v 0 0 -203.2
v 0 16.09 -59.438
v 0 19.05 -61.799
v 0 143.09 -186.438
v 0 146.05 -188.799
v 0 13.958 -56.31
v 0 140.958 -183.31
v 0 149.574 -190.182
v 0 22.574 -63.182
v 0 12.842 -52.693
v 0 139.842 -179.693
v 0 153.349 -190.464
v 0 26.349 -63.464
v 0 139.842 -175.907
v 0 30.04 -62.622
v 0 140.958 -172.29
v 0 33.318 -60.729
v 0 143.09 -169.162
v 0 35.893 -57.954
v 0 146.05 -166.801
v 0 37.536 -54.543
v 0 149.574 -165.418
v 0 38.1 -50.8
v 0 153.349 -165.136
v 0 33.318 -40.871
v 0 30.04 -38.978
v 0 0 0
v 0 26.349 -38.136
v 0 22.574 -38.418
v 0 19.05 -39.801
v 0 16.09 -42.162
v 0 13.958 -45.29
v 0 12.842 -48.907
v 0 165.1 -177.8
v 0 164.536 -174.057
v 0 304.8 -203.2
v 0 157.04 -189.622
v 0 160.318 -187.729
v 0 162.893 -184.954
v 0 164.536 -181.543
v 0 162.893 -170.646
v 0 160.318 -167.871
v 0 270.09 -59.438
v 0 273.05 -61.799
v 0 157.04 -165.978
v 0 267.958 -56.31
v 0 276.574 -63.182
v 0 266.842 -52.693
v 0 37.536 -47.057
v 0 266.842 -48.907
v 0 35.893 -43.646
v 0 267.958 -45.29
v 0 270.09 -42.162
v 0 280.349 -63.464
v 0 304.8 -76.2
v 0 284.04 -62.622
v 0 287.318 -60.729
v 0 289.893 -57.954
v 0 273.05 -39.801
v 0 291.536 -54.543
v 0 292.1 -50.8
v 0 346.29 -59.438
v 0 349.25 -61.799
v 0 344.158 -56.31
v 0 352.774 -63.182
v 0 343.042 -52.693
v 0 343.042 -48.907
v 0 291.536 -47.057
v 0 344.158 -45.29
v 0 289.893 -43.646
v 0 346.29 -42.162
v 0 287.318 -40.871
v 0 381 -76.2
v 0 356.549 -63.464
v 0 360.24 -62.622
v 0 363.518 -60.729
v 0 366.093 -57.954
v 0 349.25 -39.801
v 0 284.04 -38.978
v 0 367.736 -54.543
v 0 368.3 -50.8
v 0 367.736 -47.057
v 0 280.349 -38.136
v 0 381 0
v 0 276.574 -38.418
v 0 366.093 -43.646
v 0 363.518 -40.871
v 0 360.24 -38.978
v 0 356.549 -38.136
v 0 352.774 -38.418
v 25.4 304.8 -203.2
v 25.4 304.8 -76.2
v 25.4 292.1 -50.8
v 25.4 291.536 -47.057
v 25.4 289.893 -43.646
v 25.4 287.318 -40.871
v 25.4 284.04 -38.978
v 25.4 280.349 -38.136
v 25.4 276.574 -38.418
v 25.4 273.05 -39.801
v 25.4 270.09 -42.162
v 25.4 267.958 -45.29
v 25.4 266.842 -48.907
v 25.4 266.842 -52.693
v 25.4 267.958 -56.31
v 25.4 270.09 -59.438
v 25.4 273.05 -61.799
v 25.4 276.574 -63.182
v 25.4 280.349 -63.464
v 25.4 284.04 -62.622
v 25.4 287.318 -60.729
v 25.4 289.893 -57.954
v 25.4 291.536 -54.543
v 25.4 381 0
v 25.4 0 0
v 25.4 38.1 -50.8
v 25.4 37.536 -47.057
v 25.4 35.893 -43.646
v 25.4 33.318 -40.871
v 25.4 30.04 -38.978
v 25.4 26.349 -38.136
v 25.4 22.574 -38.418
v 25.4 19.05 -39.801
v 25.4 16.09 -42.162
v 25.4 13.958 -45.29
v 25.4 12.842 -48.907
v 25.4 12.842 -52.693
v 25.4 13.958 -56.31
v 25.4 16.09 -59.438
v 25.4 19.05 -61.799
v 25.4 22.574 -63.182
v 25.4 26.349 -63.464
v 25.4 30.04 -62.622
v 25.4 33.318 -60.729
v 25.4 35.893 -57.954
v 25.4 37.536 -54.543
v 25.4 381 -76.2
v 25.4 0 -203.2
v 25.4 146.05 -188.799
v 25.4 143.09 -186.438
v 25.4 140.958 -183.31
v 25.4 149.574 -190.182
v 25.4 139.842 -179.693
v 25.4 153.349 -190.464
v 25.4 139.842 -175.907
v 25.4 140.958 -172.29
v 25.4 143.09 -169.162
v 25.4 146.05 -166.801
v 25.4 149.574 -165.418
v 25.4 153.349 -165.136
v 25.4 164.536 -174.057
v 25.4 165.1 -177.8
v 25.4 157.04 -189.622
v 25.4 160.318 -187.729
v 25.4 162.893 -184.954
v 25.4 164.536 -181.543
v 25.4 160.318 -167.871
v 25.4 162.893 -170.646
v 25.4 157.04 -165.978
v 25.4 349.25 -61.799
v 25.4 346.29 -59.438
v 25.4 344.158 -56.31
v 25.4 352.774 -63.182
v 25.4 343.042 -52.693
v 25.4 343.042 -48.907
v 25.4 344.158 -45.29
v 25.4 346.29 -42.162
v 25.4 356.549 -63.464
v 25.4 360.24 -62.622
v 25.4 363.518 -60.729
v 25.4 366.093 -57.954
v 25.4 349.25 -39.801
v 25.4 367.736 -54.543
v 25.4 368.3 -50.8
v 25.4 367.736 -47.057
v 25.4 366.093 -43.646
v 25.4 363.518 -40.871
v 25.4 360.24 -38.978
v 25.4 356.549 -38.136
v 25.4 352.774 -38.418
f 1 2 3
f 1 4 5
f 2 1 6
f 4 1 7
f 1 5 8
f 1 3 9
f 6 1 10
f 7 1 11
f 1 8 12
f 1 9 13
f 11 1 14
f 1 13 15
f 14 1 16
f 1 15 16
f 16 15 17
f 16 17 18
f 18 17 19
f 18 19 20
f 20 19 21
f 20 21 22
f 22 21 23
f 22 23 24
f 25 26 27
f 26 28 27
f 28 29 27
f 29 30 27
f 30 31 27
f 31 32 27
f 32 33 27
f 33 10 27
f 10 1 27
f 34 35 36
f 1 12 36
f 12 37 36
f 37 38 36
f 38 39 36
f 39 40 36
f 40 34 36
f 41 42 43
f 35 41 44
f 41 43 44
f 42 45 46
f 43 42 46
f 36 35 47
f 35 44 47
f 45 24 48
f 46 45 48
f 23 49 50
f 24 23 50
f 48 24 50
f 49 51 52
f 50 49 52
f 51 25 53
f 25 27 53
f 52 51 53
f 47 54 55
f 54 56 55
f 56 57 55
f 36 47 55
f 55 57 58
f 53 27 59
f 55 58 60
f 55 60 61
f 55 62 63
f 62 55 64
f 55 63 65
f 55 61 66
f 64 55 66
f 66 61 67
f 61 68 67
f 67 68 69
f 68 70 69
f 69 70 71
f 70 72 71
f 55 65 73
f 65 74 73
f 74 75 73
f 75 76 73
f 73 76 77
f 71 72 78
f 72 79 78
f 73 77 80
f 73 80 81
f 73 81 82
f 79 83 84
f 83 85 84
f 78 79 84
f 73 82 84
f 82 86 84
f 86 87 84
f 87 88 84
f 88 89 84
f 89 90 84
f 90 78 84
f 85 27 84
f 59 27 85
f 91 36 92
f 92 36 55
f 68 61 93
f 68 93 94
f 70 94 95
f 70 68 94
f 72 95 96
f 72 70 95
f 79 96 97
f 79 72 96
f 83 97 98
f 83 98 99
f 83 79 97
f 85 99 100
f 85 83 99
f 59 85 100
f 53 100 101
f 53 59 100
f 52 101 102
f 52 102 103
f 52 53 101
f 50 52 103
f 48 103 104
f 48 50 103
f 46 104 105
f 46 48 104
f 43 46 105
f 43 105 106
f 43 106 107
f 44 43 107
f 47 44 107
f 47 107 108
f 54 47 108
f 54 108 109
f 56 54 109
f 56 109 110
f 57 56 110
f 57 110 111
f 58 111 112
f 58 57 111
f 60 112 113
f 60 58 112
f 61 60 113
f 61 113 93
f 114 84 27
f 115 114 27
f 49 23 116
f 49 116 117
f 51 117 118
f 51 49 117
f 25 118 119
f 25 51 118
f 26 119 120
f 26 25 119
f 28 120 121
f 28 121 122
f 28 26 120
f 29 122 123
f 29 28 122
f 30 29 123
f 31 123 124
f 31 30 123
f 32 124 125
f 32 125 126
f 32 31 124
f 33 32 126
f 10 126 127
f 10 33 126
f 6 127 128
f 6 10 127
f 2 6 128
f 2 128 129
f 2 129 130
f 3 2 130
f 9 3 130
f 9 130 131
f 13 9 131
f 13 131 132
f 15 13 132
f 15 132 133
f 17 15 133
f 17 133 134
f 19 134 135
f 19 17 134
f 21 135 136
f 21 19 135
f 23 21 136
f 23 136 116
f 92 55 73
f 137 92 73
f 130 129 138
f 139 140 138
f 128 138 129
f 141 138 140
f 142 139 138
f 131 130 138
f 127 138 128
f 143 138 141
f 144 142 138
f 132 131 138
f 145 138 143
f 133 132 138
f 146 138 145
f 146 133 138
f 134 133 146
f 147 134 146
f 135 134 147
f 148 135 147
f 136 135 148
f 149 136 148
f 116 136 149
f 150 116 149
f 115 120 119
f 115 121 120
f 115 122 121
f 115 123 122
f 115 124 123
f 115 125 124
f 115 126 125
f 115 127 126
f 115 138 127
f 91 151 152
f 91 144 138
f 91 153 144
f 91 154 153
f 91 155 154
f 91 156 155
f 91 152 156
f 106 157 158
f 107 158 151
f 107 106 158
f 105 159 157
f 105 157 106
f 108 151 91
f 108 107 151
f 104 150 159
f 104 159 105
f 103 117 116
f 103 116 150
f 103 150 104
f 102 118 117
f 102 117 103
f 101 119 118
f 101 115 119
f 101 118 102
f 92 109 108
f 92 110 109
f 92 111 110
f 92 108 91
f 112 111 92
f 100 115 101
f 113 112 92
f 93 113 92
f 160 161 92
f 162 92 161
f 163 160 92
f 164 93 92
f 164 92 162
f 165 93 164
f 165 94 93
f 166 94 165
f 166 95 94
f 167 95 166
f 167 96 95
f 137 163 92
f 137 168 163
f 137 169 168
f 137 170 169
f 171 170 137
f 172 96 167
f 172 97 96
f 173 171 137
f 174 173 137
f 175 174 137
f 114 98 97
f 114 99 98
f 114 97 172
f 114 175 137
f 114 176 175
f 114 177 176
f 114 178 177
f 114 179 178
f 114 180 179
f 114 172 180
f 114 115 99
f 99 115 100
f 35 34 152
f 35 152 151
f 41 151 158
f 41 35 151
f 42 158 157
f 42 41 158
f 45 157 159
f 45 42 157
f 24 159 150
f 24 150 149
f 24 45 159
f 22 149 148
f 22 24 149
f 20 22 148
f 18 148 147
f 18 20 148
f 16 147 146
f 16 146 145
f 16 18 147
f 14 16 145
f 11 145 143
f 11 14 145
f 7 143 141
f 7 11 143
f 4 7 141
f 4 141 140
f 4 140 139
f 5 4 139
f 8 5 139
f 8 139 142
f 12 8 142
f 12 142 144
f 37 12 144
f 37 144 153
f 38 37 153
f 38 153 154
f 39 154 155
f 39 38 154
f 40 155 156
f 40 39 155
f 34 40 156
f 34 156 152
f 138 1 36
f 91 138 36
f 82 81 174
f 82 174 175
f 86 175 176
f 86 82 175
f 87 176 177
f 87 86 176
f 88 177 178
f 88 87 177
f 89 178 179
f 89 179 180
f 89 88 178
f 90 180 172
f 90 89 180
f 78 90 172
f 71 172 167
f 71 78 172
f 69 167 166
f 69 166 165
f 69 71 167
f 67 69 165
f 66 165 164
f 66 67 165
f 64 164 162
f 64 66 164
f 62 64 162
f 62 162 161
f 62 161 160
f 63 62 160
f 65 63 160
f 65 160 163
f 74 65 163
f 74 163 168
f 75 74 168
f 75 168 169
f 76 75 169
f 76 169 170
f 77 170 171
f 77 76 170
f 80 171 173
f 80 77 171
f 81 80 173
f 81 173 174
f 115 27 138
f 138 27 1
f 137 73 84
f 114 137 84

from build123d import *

# Parameters (mm, degrees)
F0_R     = 12.7
F0_W     = 76.2
F0_H     = 76.2
F1_DEPTH = 25.4


with BuildPart() as f1:
    # F0 (on Right) → F1 (new body)
    with BuildSketch(Plane.YZ):
        Polygon((304.8, 0), (0, 0), (0, -203.2), (304.8, -203.2), (304.8, -76.2), align=None)
        with Locations((152.4, -177.8)):
            Circle(F0_R, mode=Mode.SUBTRACT)
        with Locations((25.4, -50.8)):
            Circle(F0_R, mode=Mode.SUBTRACT)
        with Locations((279.4, -50.8)):
            Circle(F0_R, mode=Mode.SUBTRACT)
        with Locations((342.9, -38.1)):
            Rectangle(F0_W, F0_H)
        with Locations((355.6, -50.8)):
            Circle(F0_R, mode=Mode.SUBTRACT)
    extrude(amount=F1_DEPTH)


solid = f1.part
